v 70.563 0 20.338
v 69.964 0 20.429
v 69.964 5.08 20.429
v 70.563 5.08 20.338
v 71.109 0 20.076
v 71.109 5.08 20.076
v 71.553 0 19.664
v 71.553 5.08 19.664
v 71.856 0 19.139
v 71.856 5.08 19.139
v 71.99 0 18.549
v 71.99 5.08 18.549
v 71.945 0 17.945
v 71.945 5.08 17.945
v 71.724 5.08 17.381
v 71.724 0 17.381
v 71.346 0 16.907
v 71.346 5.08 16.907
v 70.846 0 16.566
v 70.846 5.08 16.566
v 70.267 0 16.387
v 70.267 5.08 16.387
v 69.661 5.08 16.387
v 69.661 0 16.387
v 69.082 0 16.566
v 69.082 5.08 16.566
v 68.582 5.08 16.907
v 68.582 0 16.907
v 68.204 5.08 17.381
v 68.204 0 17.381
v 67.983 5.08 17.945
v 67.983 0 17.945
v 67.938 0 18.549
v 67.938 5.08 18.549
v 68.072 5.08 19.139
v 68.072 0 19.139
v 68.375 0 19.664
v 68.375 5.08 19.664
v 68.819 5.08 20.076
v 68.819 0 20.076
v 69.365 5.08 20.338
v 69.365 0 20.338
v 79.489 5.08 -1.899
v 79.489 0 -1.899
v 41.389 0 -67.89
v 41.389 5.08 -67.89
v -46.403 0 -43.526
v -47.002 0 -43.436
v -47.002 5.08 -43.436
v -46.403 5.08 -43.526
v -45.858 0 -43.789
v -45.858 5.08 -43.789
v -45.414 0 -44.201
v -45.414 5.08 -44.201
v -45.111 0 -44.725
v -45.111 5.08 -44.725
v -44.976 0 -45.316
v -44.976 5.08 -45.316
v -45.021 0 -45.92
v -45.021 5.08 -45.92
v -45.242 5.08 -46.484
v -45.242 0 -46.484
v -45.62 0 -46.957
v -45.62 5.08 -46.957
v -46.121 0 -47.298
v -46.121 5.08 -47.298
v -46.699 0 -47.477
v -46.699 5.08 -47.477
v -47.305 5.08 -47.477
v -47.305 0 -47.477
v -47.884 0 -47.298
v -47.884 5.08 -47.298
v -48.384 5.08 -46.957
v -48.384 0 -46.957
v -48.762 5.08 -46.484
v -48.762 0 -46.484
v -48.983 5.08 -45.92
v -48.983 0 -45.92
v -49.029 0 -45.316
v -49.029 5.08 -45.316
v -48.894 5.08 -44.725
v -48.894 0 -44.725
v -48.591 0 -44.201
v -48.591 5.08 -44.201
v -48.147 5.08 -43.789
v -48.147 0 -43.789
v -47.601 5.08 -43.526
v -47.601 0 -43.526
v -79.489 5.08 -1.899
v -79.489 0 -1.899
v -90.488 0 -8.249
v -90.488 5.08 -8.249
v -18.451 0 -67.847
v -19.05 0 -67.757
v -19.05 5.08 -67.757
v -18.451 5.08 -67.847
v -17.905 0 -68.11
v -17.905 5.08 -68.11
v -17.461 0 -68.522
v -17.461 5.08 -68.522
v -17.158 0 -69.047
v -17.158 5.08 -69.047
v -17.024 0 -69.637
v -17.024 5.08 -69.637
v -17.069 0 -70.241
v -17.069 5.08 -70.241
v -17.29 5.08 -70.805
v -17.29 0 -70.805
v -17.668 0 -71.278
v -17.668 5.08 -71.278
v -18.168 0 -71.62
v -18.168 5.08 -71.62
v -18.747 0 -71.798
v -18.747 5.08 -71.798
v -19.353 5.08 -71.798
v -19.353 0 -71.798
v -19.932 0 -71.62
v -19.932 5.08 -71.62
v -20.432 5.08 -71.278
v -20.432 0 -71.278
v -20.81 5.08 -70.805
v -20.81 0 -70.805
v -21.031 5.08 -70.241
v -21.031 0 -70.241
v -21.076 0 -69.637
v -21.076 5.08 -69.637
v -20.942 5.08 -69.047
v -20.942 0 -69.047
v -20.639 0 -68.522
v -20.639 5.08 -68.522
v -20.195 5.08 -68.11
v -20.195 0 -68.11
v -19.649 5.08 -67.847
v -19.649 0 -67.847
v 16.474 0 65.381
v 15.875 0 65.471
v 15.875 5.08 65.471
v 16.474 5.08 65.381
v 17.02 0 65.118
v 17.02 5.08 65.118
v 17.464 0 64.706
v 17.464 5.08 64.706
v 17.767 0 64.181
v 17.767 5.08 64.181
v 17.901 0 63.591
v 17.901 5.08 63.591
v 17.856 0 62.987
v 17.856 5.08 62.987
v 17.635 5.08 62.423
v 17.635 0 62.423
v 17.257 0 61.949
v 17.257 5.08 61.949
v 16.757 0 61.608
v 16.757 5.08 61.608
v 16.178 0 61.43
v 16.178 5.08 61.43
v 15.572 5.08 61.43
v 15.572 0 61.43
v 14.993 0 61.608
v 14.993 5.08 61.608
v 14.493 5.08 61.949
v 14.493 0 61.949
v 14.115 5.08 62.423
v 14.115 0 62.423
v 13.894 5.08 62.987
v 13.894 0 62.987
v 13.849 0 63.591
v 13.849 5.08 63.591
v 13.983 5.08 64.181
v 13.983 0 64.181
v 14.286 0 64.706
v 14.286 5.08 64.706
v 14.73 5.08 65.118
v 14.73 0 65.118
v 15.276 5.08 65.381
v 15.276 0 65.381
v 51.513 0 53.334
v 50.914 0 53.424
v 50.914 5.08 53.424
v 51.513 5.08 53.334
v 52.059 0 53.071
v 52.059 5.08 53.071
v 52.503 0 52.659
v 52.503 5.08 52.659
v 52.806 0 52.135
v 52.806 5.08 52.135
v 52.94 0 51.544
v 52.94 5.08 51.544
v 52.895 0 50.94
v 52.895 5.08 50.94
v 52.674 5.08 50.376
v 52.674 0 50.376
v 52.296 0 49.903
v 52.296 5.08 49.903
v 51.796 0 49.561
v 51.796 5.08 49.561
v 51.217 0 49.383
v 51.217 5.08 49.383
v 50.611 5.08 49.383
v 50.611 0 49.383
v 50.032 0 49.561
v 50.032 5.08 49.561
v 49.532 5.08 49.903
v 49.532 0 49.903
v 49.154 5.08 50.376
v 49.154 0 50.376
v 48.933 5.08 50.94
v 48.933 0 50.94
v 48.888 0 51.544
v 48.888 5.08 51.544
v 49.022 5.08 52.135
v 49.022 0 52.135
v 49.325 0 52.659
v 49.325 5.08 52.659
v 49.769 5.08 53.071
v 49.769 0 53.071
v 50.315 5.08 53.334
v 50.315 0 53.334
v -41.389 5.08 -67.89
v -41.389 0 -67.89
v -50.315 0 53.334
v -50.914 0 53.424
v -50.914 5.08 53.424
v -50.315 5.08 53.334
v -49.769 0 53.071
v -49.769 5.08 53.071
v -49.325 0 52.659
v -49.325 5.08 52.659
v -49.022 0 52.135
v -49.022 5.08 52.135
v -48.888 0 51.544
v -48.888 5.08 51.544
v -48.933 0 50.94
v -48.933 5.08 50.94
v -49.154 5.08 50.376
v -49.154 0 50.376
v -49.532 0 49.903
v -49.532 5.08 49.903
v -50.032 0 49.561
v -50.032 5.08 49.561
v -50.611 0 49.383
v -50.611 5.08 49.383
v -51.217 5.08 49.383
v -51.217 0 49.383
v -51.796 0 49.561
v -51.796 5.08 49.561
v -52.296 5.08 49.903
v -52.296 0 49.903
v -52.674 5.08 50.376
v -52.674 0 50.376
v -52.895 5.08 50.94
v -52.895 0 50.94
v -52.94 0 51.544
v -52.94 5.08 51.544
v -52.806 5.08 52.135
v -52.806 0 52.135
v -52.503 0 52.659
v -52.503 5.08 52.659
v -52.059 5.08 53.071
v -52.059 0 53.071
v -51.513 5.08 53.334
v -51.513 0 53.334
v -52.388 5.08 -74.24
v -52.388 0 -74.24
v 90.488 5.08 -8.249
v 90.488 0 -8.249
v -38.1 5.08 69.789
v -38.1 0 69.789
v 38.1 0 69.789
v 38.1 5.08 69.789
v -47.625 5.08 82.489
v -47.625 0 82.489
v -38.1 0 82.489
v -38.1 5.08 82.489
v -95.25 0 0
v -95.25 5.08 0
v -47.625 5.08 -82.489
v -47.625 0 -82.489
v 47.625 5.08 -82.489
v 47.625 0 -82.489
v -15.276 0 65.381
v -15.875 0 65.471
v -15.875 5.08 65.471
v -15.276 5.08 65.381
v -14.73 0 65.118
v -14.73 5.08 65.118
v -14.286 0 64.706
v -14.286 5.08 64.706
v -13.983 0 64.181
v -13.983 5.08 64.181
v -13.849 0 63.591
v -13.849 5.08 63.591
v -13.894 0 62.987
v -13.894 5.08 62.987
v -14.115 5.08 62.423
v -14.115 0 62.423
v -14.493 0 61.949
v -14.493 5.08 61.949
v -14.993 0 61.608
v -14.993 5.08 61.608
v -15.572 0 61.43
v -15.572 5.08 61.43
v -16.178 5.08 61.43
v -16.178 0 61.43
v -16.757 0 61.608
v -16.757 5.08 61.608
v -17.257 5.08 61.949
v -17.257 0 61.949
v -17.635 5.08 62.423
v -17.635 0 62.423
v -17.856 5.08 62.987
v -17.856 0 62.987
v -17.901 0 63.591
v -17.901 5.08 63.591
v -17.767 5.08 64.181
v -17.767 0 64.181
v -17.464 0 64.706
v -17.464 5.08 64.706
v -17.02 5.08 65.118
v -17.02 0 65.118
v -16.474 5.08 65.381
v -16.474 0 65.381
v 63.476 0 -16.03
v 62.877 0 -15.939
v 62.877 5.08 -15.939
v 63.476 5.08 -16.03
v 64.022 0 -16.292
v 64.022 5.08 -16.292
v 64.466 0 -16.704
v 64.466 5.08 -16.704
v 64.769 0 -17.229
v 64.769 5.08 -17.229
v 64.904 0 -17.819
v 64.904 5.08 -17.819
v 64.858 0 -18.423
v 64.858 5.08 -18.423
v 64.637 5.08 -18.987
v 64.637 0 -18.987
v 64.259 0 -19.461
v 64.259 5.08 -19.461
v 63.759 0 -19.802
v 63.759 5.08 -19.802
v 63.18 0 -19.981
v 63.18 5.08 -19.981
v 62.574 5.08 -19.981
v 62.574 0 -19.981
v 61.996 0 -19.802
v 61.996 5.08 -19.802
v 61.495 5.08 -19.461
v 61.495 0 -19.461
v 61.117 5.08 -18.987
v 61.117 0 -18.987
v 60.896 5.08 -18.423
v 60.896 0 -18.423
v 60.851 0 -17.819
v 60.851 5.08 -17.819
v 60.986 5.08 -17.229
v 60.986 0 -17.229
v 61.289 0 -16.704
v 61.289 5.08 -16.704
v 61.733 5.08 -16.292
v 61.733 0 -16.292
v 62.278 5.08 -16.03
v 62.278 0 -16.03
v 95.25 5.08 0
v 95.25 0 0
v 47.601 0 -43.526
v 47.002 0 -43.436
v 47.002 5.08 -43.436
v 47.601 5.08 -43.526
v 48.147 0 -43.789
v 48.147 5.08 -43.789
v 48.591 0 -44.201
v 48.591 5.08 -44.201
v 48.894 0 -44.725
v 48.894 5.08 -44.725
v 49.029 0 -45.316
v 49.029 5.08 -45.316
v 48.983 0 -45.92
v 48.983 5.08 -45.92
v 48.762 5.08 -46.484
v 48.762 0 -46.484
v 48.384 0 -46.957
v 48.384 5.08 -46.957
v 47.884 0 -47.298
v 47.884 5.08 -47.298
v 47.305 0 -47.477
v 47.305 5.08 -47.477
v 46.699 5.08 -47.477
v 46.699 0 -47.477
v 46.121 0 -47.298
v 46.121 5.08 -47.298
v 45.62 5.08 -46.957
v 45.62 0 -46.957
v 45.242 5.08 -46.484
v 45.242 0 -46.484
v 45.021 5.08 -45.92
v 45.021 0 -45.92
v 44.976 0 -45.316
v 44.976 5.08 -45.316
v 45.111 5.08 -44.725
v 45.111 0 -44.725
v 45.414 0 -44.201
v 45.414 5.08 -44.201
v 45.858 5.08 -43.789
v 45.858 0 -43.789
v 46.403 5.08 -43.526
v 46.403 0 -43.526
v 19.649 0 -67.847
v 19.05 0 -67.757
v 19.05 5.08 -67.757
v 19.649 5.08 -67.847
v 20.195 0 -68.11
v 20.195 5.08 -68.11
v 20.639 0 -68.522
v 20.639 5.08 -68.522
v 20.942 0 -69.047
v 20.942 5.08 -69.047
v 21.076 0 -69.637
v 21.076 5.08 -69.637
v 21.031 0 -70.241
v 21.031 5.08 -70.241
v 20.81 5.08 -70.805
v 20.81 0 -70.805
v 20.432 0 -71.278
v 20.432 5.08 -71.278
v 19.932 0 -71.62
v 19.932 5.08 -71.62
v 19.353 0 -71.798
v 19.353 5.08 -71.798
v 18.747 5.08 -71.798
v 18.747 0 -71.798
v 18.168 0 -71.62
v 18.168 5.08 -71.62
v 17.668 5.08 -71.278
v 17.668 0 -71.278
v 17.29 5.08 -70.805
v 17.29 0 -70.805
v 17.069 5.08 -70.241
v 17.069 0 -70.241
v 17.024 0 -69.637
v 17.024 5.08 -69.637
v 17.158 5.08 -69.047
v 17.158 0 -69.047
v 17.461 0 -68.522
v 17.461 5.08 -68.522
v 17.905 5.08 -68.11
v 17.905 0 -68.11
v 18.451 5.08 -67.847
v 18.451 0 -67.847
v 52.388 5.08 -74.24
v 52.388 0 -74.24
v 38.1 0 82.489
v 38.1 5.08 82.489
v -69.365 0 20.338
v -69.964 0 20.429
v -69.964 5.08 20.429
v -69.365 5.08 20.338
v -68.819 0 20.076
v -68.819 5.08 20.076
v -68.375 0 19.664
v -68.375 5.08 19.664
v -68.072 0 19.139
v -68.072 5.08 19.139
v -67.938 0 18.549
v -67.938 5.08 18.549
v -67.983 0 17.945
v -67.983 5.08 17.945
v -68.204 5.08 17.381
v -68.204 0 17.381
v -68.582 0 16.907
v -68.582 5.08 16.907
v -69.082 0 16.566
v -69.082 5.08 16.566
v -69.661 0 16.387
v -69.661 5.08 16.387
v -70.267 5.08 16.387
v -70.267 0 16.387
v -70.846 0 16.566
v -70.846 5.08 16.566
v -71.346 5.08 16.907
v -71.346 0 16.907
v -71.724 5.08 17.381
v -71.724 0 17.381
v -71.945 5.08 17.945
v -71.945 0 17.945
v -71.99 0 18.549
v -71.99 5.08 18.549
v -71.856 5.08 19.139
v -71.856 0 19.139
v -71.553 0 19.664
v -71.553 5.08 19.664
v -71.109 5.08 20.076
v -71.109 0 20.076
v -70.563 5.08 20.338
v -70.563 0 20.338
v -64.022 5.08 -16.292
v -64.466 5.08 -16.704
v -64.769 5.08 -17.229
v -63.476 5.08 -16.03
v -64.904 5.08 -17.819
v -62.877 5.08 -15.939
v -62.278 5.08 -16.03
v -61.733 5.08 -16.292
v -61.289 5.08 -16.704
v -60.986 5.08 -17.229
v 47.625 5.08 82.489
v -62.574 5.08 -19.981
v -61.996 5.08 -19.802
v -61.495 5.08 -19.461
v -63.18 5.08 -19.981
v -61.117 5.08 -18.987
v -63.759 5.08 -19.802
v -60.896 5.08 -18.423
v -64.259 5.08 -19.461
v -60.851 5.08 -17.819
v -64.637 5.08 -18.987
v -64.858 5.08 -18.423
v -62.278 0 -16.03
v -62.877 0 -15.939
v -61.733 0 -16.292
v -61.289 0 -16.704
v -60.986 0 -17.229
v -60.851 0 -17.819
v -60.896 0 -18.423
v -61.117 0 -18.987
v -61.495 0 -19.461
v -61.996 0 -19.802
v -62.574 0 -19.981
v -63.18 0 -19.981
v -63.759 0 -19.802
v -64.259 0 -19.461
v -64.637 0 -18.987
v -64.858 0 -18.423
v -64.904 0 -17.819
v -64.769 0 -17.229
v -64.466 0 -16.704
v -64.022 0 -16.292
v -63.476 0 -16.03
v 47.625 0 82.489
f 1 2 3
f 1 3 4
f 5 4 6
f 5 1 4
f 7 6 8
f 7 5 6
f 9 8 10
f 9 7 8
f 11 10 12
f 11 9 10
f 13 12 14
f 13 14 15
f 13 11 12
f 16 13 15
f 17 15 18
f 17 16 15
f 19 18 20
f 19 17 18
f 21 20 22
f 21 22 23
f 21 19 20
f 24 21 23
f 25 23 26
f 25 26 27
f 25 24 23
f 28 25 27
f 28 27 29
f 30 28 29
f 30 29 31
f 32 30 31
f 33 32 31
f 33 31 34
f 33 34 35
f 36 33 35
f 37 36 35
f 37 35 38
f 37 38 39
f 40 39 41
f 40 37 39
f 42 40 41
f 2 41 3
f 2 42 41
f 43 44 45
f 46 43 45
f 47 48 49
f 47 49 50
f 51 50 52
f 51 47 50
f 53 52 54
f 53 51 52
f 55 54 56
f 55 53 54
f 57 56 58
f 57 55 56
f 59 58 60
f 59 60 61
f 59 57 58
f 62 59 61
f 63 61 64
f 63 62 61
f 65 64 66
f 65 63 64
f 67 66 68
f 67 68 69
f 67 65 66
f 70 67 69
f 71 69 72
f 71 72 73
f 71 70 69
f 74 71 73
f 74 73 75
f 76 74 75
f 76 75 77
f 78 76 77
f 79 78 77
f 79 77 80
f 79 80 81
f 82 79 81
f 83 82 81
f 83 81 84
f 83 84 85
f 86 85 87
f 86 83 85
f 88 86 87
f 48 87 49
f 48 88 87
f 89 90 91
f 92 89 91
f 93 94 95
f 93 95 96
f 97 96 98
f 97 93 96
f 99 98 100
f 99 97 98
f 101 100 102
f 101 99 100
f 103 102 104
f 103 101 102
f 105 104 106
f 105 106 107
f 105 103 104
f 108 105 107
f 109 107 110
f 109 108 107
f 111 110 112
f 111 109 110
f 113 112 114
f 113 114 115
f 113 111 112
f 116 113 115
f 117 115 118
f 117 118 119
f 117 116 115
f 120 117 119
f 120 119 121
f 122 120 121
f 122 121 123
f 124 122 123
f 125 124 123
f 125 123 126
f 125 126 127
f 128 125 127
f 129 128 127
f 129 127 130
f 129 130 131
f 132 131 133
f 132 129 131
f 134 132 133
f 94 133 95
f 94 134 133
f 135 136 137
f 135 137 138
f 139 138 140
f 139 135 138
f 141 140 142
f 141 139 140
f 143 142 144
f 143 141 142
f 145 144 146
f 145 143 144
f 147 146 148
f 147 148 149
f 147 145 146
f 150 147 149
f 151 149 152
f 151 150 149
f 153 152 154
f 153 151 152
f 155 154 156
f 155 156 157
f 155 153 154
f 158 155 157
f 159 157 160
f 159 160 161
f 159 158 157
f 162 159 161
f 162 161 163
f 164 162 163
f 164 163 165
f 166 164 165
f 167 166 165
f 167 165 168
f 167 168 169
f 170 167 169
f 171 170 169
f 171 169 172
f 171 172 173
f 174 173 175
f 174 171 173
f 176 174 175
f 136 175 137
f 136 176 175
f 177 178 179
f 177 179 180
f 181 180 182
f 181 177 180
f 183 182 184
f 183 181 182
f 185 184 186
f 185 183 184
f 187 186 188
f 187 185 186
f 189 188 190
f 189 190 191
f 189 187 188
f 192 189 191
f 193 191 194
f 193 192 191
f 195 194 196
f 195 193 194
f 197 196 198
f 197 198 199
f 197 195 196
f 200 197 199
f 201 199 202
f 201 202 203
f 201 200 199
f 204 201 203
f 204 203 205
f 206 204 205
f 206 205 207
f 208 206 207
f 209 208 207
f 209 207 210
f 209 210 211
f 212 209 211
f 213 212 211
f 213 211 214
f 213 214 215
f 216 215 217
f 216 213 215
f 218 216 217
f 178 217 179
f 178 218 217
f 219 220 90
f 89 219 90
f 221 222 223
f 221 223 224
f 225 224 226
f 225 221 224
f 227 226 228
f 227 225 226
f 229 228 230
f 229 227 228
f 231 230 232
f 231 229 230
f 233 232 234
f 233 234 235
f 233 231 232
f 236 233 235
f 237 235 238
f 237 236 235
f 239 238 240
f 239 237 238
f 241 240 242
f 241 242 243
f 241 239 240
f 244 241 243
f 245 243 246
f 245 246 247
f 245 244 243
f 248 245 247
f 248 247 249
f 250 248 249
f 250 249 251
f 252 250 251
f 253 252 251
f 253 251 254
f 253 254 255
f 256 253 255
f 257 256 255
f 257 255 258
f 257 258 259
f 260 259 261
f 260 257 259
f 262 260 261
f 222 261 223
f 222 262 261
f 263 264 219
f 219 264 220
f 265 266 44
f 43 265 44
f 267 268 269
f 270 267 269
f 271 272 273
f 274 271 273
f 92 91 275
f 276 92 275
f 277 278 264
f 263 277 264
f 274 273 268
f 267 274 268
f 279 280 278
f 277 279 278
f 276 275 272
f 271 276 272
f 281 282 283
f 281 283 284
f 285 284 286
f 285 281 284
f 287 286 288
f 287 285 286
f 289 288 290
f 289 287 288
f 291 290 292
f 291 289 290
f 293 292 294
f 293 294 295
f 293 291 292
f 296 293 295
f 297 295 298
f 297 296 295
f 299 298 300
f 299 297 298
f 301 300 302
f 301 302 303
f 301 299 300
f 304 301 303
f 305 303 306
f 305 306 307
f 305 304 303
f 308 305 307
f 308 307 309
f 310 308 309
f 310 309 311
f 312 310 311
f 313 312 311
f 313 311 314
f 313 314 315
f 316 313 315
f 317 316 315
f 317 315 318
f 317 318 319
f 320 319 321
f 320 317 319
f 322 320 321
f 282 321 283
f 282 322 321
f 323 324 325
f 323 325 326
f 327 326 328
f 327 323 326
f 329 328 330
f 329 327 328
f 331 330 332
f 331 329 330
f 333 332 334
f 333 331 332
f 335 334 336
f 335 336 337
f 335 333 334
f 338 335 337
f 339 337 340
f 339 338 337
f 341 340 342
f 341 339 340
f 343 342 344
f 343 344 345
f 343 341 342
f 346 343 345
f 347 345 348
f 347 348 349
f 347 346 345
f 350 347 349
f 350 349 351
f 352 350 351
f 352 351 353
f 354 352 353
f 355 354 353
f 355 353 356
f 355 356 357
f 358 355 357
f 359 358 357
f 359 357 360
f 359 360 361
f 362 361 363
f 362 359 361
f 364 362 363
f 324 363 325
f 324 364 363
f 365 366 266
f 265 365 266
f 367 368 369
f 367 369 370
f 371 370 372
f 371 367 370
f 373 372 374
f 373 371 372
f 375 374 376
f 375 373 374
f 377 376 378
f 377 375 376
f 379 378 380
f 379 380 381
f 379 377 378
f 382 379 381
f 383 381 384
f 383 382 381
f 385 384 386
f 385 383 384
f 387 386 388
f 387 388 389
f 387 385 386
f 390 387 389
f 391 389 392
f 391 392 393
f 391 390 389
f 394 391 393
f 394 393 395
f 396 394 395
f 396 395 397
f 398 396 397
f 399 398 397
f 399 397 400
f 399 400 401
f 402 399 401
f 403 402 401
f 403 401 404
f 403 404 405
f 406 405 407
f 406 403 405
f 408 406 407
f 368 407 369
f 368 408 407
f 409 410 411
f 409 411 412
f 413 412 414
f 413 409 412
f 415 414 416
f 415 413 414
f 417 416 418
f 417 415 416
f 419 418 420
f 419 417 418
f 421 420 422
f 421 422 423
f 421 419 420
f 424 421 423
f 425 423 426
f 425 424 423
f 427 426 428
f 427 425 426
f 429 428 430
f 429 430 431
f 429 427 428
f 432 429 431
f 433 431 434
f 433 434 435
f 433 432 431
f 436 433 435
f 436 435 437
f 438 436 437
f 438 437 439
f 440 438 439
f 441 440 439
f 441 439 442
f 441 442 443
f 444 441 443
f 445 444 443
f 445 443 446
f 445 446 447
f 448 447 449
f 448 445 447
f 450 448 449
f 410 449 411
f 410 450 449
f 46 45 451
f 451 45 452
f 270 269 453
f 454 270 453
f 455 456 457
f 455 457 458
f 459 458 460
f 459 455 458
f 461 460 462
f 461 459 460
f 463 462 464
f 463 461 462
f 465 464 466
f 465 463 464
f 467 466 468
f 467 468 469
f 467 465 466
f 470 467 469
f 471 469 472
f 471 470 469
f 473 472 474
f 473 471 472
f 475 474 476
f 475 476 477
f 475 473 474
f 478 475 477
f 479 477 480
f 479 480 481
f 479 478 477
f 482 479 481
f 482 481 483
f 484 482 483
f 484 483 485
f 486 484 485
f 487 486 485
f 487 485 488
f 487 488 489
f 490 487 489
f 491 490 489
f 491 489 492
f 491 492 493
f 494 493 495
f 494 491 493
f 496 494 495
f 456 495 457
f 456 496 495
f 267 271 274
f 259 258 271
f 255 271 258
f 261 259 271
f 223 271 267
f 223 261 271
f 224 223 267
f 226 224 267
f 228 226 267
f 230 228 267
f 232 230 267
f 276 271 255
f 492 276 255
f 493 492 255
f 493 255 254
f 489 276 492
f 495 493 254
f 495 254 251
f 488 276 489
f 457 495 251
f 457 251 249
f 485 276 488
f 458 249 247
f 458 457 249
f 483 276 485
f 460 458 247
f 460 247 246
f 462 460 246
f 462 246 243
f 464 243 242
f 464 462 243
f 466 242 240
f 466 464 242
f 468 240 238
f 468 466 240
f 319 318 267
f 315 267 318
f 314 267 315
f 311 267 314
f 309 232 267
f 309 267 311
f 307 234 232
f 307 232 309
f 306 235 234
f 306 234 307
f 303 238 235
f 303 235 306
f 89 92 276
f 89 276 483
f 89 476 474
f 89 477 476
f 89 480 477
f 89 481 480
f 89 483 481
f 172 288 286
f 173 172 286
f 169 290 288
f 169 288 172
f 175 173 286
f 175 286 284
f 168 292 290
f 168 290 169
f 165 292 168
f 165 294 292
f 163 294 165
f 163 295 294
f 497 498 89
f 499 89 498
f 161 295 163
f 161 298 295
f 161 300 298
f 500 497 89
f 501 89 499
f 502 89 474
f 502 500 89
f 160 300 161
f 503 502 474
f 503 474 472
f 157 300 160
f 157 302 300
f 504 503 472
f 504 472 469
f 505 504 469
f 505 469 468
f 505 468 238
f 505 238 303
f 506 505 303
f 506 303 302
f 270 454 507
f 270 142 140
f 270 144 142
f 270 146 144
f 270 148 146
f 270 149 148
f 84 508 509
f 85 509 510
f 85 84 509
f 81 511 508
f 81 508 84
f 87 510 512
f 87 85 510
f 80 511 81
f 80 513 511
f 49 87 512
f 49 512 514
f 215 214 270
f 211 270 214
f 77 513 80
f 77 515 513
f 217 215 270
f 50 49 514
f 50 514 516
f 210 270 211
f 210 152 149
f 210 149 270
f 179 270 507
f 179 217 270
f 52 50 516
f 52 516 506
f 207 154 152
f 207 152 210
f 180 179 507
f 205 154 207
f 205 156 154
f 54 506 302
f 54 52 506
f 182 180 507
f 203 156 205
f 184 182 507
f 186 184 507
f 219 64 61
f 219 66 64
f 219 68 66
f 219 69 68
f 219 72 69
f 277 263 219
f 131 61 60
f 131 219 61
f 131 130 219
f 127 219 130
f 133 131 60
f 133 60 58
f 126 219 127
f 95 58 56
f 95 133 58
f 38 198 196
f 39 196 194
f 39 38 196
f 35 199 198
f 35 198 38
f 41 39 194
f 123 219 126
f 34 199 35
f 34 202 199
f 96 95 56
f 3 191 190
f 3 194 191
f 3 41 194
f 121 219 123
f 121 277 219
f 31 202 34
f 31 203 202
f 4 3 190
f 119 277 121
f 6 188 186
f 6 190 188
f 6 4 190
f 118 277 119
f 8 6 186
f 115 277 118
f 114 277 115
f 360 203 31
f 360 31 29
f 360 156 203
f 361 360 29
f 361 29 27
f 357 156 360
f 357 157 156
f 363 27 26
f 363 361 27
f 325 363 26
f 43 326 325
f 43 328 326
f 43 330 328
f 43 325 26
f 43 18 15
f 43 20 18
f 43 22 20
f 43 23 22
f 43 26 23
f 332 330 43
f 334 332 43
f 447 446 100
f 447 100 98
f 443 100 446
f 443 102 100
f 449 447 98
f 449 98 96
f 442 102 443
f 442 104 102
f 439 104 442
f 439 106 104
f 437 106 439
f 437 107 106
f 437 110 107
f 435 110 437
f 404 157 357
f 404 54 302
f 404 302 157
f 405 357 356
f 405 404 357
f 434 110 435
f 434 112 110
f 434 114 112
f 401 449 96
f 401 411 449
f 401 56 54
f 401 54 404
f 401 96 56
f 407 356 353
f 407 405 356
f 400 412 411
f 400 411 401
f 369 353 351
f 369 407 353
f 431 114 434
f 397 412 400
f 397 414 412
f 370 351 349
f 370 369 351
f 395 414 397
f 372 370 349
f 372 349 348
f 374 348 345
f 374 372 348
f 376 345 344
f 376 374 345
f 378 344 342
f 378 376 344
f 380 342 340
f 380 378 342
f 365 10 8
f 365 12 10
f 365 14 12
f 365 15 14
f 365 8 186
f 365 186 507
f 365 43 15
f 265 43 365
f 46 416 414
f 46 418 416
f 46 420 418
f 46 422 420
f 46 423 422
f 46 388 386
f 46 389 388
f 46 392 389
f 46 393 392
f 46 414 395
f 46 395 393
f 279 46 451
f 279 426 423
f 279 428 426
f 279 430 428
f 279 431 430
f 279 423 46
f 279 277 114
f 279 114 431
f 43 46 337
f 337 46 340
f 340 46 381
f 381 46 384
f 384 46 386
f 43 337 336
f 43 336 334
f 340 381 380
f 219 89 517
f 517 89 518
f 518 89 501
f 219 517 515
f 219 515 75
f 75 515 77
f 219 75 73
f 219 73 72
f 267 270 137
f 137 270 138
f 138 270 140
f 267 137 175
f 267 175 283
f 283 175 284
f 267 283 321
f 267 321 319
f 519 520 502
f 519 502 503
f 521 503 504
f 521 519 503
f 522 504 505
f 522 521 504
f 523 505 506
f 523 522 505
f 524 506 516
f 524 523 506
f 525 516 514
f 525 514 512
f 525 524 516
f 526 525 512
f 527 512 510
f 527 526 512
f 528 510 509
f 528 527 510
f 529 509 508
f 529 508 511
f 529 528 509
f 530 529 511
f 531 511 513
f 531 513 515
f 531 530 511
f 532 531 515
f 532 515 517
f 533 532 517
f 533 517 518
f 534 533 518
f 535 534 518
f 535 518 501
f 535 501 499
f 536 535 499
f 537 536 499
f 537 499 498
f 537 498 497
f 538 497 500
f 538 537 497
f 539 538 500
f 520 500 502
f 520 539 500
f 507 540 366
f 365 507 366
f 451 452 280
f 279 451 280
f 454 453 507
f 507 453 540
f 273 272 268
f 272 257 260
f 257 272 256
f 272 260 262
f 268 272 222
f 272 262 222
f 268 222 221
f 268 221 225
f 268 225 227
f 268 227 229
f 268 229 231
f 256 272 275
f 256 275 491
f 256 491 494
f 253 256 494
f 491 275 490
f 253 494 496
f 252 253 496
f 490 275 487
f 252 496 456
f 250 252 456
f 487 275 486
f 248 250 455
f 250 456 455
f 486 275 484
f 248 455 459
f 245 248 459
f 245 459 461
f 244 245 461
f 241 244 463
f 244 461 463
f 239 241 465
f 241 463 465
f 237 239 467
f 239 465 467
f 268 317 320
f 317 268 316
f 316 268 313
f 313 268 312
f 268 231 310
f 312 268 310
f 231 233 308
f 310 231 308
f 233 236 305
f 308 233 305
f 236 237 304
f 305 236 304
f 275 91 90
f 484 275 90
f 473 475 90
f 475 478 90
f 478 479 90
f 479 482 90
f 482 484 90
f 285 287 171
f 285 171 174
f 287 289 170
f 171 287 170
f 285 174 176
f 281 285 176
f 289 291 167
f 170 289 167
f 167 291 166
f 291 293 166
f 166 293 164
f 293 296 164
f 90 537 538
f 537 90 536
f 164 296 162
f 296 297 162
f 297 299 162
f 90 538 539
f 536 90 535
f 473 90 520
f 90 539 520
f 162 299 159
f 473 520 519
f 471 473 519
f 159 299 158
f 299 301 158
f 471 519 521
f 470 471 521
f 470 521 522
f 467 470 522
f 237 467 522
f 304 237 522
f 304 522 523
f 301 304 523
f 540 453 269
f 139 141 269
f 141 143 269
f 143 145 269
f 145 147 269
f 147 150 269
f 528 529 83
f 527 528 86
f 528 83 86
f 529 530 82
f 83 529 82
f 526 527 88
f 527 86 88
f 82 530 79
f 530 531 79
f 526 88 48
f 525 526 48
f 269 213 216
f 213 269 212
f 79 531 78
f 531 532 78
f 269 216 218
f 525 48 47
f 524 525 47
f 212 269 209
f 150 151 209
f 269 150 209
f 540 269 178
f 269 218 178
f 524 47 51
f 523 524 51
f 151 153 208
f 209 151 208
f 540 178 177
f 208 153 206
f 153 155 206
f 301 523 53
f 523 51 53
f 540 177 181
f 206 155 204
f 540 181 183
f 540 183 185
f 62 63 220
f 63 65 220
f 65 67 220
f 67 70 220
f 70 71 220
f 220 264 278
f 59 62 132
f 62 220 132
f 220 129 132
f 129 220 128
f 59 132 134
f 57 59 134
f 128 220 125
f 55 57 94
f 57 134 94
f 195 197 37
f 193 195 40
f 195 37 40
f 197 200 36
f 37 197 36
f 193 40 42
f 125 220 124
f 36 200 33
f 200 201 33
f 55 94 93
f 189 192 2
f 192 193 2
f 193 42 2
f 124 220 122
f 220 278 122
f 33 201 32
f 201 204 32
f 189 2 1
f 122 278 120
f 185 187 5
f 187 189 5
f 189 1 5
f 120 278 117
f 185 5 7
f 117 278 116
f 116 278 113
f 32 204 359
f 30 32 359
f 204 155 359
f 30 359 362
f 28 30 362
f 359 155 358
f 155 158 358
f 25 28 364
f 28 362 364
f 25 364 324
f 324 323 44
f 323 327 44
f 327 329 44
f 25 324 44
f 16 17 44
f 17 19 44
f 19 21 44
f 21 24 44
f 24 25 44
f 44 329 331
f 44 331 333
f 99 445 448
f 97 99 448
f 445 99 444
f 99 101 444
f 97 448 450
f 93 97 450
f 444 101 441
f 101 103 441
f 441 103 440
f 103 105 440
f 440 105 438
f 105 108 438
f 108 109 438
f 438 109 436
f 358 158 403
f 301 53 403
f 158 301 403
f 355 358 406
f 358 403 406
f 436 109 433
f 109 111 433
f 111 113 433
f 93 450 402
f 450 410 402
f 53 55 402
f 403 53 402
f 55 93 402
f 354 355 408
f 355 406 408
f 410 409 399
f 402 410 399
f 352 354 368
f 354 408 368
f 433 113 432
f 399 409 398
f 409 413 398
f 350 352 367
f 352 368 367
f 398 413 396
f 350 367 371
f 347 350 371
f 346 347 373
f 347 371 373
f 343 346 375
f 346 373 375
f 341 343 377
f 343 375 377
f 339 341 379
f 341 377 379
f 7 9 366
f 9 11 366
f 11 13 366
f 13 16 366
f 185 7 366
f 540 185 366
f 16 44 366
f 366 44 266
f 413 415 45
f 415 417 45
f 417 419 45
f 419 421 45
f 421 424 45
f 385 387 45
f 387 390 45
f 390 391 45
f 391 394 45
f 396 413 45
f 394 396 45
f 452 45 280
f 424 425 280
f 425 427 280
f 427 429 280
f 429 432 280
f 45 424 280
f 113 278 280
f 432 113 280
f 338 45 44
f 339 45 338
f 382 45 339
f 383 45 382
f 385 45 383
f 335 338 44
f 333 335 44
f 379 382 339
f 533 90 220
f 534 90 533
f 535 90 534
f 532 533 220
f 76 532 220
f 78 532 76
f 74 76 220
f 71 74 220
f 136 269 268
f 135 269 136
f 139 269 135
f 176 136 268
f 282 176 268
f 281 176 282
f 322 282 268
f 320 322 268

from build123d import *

# Parameters (mm, degrees)
SKETCH1_R           = 2.032
BOSS_EXTRUDE4_DEPTH = 5.08


with BuildPart() as part:
    # Sketch1 → Boss-Extrude4 (new body)
    with BuildSketch(Plane(origin=(0, 0, 0), x_dir=(1, 0, 0), z_dir=(0, 1, 0))):
        Polygon((38.1, -82.48891971), (47.625, -82.48891971), (95.25, 0), (90.4875, 8.248891971), (79.488977372, 1.898891971), (41.388977372, 67.890027739), (52.3875, 74.240027739), (47.625, 82.48891971), (-47.625, 82.48891971), (-52.3875, 74.240027739), (-41.388977372, 67.890027739), (-79.488977372, 1.898891971), (-90.4875, 8.248891971), (-95.25, 0), (-47.625, -82.48891971), (-38.1, -82.48891971), (-38.1, -69.78891971), (38.1, -69.78891971), align=None)
        with Locations(Location((-50.913977372, -51.392243797, 0), (0, 0, 270))):
            Circle(SKETCH1_R, mode=Mode.SUBTRACT)
        with Locations(Location((-15.875, -63.43891971, 0), (0, 0, 270))):
            Circle(SKETCH1_R, mode=Mode.SUBTRACT)
        with Locations(Location((-69.963977372, -18.396675913, 0), (0, 0, 270))):
            Circle(SKETCH1_R, mode=Mode.SUBTRACT)
        with Locations(Location((15.875, -63.43891971, 0), (0, 0, 270))):
            Circle(SKETCH1_R, mode=Mode.SUBTRACT)
        with Locations(Location((50.913977372, -51.392243797, 0), (0, 0, 270))):
            Circle(SKETCH1_R, mode=Mode.SUBTRACT)
        with Locations(Location((69.963977372, -18.396675913, 0), (0, 0, 270))):
            Circle(SKETCH1_R, mode=Mode.SUBTRACT)
        with Locations(Location((-62.877216058, 17.97130657, 0), (0, 0, 270))):
            Circle(SKETCH1_R, mode=Mode.SUBTRACT)
        with Locations(Location((-47.002216058, 45.46761314, 0), (0, 0, 270))):
            Circle(SKETCH1_R, mode=Mode.SUBTRACT)
        with Locations(Location((-19.05, 69.78891971, 0), (0, 0, 270))):
            Circle(SKETCH1_R, mode=Mode.SUBTRACT)
        with Locations(Location((62.877216058, 17.97130657, 0), (0, 0, 270))):
            Circle(SKETCH1_R, mode=Mode.SUBTRACT)
        with Locations(Location((47.002216058, 45.46761314, 0), (0, 0, 270))):
            Circle(SKETCH1_R, mode=Mode.SUBTRACT)
        with Locations(Location((19.05, 69.78891971, 0), (0, 0, 270))):
            Circle(SKETCH1_R, mode=Mode.SUBTRACT)
    extrude(amount=BOSS_EXTRUDE4_DEPTH)


solid = part.part
